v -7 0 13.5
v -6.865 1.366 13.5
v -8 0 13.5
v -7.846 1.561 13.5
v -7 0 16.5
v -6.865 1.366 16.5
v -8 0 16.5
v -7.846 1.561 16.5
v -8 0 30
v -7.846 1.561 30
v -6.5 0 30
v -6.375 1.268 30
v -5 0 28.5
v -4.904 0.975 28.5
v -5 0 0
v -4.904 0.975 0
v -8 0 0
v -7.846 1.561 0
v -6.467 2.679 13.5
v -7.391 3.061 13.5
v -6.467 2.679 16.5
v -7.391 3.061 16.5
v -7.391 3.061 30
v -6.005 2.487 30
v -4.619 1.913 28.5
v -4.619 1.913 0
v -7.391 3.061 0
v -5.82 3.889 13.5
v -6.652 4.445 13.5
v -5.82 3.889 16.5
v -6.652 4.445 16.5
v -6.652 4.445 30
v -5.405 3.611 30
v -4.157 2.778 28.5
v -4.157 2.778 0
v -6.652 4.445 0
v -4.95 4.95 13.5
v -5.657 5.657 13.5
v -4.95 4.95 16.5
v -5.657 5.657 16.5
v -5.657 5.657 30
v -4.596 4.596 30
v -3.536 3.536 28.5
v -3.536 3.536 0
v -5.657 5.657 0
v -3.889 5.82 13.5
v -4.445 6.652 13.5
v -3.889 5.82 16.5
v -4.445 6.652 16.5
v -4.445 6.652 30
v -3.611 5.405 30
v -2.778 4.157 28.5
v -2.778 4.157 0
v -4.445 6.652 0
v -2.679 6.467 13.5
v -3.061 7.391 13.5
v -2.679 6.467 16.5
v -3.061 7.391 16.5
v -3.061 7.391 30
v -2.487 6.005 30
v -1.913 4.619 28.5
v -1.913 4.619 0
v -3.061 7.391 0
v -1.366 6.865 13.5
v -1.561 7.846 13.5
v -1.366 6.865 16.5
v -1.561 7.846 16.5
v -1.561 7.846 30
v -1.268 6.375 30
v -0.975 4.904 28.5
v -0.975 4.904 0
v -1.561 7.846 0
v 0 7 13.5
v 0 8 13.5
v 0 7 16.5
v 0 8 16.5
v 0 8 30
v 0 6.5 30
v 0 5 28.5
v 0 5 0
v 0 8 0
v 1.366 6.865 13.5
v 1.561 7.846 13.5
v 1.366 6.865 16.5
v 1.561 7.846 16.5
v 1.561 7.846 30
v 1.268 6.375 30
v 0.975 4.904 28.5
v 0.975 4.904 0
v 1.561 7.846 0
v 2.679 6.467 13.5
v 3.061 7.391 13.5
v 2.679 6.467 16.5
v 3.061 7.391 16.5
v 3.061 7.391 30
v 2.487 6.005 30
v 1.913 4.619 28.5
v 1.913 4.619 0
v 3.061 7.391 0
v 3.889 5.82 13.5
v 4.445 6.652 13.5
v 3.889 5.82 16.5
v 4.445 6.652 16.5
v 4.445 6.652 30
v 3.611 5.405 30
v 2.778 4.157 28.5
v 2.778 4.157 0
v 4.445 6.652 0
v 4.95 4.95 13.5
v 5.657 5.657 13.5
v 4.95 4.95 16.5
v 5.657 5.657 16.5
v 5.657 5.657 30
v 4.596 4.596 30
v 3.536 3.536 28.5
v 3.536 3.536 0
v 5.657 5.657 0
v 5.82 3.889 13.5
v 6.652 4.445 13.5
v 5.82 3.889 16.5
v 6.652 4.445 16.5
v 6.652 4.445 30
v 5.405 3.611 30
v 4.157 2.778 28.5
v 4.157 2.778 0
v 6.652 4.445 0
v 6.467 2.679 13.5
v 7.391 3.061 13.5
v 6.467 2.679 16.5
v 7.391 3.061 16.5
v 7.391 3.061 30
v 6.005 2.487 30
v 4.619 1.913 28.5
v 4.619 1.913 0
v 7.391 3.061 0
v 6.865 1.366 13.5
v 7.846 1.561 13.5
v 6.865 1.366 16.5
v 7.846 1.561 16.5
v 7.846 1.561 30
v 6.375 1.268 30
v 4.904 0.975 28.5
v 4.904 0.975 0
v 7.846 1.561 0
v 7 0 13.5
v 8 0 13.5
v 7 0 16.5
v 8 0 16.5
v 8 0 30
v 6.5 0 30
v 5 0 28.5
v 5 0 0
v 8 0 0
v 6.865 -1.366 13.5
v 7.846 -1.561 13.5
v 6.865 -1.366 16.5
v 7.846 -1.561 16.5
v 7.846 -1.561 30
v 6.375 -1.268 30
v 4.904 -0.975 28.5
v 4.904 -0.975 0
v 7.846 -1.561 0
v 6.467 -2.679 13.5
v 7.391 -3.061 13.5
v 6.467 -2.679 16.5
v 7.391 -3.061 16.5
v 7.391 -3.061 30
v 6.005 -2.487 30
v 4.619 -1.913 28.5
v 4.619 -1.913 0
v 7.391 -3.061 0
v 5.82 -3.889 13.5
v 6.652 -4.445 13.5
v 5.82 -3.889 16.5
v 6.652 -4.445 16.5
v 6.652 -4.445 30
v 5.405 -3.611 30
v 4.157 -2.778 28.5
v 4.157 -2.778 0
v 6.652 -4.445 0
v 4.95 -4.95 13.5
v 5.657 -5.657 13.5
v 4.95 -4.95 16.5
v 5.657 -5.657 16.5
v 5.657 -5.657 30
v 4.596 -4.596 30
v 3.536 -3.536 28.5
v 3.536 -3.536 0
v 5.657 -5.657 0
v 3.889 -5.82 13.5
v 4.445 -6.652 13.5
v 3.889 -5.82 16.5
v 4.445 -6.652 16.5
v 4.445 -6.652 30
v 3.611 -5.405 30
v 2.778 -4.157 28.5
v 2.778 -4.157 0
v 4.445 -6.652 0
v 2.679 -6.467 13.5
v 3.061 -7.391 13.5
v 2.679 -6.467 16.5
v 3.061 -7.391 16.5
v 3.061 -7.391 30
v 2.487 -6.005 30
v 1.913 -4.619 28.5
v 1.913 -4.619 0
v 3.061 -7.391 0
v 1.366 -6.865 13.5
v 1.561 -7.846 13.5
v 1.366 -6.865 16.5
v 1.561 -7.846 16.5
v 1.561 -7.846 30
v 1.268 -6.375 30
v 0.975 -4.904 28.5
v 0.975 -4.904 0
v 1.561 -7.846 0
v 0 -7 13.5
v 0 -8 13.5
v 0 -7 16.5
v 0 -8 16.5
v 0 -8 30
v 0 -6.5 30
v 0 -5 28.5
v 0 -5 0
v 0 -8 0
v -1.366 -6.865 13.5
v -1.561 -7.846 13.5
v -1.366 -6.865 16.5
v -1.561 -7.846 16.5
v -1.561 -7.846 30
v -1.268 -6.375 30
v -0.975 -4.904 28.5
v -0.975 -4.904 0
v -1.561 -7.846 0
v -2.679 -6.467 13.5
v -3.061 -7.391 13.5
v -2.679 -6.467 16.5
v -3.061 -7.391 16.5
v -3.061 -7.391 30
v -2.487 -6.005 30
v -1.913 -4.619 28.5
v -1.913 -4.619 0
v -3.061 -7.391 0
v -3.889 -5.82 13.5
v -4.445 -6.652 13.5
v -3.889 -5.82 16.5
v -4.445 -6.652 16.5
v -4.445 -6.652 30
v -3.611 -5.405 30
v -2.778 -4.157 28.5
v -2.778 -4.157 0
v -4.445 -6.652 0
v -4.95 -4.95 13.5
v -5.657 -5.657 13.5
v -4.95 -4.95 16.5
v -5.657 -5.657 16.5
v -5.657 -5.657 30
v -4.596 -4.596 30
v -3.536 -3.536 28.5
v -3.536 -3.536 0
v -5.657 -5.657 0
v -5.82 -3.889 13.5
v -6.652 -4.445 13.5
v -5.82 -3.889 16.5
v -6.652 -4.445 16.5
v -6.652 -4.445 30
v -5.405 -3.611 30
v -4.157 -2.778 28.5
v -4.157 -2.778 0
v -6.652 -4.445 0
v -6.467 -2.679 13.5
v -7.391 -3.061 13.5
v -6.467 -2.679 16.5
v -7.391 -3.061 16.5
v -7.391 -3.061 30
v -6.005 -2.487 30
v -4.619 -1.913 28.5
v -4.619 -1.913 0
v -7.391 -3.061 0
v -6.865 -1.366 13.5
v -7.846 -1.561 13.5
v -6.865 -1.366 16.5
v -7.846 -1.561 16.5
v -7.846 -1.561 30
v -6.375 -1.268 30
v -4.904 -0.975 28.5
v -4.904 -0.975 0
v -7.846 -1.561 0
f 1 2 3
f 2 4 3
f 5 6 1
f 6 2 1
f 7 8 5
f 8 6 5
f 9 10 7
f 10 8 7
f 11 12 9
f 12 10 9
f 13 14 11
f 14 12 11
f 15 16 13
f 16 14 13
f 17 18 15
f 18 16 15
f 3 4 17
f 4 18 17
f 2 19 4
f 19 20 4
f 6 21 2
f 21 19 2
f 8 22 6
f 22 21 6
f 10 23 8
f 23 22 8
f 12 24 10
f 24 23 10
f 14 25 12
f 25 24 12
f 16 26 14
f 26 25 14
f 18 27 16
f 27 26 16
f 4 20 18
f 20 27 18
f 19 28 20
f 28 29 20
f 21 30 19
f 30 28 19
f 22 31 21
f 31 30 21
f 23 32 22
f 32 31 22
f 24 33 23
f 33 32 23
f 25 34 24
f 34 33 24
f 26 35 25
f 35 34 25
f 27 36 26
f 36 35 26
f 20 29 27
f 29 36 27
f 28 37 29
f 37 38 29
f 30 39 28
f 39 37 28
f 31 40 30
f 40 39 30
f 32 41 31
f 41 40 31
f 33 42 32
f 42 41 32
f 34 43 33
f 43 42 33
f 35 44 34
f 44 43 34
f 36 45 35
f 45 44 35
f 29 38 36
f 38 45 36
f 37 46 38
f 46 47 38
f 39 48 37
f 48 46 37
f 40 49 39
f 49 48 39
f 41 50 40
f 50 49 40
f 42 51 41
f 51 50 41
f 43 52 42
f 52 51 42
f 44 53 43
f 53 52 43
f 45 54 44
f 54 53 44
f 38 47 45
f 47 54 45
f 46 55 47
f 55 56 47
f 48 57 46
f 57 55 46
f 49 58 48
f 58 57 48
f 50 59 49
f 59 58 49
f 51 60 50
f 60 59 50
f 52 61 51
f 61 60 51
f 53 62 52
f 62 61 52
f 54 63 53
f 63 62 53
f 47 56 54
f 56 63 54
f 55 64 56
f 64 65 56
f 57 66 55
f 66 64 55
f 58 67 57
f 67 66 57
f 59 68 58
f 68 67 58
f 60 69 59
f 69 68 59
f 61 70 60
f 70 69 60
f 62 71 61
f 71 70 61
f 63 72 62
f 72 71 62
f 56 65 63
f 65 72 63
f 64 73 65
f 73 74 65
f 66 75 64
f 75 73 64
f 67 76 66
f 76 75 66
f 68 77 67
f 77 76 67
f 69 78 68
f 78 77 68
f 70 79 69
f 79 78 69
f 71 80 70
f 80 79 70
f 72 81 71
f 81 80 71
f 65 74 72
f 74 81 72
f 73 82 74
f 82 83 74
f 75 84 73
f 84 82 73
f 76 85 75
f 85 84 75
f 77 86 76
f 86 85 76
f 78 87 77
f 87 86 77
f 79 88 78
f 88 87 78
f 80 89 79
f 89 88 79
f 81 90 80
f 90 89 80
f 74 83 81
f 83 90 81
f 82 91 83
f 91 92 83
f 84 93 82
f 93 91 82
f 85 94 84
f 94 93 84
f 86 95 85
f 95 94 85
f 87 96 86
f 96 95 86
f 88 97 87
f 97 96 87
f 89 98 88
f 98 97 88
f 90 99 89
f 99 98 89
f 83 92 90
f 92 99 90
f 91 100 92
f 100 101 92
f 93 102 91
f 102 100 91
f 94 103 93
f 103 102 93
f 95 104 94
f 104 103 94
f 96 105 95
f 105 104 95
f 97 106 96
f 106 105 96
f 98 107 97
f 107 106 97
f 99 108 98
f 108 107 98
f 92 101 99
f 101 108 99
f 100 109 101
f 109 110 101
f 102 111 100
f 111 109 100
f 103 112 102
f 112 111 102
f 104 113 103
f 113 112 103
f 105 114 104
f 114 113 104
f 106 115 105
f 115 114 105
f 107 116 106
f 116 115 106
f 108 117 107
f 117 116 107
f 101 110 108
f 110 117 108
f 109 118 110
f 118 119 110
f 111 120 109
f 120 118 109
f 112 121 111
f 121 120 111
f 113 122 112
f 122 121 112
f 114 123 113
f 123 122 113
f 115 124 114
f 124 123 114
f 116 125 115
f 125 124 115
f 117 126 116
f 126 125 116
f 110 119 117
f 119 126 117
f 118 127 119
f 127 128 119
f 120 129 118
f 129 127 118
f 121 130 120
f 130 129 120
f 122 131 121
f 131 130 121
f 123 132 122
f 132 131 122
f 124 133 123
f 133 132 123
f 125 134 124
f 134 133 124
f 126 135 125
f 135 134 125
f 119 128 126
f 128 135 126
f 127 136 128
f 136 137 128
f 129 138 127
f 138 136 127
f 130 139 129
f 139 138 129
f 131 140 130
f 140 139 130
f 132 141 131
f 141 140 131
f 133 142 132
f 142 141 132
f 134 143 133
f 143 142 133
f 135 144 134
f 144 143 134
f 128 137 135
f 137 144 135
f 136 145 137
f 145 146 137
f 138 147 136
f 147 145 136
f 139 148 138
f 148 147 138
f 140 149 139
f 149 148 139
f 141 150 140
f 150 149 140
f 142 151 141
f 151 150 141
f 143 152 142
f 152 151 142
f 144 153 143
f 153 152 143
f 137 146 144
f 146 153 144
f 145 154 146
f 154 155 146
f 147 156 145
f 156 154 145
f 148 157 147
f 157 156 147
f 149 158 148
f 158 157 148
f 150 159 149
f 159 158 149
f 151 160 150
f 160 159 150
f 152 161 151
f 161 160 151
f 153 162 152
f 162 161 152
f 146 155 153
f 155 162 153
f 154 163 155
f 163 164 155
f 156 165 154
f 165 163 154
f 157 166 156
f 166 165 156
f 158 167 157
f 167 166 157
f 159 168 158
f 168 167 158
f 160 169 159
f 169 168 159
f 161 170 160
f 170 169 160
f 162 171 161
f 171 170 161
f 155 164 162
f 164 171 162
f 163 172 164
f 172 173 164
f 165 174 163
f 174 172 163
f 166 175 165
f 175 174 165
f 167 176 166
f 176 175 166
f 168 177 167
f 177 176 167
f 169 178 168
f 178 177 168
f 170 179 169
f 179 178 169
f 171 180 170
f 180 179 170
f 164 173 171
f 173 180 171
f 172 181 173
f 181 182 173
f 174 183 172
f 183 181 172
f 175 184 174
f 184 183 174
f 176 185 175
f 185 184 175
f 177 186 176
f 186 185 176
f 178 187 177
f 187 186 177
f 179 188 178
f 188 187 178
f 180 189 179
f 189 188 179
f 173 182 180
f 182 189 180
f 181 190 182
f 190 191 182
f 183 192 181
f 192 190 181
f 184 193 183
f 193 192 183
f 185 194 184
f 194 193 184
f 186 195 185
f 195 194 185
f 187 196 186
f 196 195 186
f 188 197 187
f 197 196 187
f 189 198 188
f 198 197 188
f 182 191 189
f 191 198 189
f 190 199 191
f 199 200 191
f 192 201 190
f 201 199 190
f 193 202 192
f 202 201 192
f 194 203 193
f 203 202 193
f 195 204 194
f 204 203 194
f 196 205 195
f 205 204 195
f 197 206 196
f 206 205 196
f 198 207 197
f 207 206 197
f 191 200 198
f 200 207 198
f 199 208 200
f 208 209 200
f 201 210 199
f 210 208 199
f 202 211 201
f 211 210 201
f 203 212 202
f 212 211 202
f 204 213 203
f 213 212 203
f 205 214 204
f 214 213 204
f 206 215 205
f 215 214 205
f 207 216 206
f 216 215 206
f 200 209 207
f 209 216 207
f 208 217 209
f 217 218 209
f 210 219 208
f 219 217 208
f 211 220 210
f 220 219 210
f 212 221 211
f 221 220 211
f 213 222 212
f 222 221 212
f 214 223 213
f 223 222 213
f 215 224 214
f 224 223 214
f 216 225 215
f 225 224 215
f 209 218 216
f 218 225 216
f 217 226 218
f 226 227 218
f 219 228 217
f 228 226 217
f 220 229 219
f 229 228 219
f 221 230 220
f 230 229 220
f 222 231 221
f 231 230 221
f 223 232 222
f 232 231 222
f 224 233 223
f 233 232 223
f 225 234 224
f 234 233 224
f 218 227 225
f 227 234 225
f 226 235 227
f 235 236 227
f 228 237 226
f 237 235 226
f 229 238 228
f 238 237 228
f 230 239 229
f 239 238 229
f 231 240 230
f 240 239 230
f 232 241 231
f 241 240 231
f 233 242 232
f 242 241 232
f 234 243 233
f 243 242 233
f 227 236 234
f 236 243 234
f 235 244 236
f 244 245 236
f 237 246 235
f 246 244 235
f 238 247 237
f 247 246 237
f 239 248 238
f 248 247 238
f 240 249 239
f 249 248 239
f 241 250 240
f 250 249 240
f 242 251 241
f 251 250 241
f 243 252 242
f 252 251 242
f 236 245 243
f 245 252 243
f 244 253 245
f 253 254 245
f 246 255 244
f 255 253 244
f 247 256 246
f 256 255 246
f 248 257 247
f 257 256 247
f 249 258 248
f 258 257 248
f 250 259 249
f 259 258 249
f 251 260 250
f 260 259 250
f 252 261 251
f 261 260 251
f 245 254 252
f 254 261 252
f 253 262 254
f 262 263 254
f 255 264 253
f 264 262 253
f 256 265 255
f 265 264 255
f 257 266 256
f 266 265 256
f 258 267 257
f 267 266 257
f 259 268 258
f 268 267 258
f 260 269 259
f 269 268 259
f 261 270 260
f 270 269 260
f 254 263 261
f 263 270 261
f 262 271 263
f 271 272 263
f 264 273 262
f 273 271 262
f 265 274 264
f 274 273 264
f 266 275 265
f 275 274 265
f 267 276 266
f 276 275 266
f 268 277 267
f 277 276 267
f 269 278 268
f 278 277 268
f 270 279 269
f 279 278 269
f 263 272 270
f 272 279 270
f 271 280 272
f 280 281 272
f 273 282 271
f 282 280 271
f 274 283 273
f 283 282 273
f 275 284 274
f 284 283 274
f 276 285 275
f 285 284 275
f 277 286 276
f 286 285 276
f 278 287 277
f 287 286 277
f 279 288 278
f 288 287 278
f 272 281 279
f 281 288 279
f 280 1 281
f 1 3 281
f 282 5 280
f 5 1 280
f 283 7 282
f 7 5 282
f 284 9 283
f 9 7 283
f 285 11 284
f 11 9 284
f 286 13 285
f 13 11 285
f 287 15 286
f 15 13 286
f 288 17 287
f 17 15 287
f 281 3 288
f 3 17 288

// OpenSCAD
$fn = 32;

// ----------------------------------------------------------------------
// Grooved revolve: thread_relief, bore R5
// ----------------------------------------------------------------------

// --- parameters (mm) ---
bore_r = 5;               // bore radius
outer_r = 8;              // outer radius of the body
total_h = 30;             // overall height, Z
wall = 3;                 // radial wall thickness
groove_w = 3;             // groove width
groove_d = 1;             // groove depth
grooves = 1;              // number of outer grooves
relief = 1.5;             // thread relief leg at the bore mouth
relief_angle = 45;        // thread relief chamfer angle, degrees
fit_tol = 0.02;           // declared fit tolerance (prompt contract)
free_tol = 0.2;           // declared free tolerance (prompt contract)

bbox_x = 2 * outer_r;  // full diameter
bore_d = 2 * bore_r;  // bore diameter
body_d = 2 * outer_r;  // body diameter
revolve_angle = 360;  // full turn around the Z axis

profile = [[5, 0], [8, 0], [8, 13.5], [7, 13.5], [7, 16.5], [8, 16.5], [8, 30], [6.5, 30], [5, 28.5]];  // primary outline, 9 points, counter clockwise

// --- the one profile operation ---
rotate_extrude(angle = revolve_angle) polygon(points = profile);
